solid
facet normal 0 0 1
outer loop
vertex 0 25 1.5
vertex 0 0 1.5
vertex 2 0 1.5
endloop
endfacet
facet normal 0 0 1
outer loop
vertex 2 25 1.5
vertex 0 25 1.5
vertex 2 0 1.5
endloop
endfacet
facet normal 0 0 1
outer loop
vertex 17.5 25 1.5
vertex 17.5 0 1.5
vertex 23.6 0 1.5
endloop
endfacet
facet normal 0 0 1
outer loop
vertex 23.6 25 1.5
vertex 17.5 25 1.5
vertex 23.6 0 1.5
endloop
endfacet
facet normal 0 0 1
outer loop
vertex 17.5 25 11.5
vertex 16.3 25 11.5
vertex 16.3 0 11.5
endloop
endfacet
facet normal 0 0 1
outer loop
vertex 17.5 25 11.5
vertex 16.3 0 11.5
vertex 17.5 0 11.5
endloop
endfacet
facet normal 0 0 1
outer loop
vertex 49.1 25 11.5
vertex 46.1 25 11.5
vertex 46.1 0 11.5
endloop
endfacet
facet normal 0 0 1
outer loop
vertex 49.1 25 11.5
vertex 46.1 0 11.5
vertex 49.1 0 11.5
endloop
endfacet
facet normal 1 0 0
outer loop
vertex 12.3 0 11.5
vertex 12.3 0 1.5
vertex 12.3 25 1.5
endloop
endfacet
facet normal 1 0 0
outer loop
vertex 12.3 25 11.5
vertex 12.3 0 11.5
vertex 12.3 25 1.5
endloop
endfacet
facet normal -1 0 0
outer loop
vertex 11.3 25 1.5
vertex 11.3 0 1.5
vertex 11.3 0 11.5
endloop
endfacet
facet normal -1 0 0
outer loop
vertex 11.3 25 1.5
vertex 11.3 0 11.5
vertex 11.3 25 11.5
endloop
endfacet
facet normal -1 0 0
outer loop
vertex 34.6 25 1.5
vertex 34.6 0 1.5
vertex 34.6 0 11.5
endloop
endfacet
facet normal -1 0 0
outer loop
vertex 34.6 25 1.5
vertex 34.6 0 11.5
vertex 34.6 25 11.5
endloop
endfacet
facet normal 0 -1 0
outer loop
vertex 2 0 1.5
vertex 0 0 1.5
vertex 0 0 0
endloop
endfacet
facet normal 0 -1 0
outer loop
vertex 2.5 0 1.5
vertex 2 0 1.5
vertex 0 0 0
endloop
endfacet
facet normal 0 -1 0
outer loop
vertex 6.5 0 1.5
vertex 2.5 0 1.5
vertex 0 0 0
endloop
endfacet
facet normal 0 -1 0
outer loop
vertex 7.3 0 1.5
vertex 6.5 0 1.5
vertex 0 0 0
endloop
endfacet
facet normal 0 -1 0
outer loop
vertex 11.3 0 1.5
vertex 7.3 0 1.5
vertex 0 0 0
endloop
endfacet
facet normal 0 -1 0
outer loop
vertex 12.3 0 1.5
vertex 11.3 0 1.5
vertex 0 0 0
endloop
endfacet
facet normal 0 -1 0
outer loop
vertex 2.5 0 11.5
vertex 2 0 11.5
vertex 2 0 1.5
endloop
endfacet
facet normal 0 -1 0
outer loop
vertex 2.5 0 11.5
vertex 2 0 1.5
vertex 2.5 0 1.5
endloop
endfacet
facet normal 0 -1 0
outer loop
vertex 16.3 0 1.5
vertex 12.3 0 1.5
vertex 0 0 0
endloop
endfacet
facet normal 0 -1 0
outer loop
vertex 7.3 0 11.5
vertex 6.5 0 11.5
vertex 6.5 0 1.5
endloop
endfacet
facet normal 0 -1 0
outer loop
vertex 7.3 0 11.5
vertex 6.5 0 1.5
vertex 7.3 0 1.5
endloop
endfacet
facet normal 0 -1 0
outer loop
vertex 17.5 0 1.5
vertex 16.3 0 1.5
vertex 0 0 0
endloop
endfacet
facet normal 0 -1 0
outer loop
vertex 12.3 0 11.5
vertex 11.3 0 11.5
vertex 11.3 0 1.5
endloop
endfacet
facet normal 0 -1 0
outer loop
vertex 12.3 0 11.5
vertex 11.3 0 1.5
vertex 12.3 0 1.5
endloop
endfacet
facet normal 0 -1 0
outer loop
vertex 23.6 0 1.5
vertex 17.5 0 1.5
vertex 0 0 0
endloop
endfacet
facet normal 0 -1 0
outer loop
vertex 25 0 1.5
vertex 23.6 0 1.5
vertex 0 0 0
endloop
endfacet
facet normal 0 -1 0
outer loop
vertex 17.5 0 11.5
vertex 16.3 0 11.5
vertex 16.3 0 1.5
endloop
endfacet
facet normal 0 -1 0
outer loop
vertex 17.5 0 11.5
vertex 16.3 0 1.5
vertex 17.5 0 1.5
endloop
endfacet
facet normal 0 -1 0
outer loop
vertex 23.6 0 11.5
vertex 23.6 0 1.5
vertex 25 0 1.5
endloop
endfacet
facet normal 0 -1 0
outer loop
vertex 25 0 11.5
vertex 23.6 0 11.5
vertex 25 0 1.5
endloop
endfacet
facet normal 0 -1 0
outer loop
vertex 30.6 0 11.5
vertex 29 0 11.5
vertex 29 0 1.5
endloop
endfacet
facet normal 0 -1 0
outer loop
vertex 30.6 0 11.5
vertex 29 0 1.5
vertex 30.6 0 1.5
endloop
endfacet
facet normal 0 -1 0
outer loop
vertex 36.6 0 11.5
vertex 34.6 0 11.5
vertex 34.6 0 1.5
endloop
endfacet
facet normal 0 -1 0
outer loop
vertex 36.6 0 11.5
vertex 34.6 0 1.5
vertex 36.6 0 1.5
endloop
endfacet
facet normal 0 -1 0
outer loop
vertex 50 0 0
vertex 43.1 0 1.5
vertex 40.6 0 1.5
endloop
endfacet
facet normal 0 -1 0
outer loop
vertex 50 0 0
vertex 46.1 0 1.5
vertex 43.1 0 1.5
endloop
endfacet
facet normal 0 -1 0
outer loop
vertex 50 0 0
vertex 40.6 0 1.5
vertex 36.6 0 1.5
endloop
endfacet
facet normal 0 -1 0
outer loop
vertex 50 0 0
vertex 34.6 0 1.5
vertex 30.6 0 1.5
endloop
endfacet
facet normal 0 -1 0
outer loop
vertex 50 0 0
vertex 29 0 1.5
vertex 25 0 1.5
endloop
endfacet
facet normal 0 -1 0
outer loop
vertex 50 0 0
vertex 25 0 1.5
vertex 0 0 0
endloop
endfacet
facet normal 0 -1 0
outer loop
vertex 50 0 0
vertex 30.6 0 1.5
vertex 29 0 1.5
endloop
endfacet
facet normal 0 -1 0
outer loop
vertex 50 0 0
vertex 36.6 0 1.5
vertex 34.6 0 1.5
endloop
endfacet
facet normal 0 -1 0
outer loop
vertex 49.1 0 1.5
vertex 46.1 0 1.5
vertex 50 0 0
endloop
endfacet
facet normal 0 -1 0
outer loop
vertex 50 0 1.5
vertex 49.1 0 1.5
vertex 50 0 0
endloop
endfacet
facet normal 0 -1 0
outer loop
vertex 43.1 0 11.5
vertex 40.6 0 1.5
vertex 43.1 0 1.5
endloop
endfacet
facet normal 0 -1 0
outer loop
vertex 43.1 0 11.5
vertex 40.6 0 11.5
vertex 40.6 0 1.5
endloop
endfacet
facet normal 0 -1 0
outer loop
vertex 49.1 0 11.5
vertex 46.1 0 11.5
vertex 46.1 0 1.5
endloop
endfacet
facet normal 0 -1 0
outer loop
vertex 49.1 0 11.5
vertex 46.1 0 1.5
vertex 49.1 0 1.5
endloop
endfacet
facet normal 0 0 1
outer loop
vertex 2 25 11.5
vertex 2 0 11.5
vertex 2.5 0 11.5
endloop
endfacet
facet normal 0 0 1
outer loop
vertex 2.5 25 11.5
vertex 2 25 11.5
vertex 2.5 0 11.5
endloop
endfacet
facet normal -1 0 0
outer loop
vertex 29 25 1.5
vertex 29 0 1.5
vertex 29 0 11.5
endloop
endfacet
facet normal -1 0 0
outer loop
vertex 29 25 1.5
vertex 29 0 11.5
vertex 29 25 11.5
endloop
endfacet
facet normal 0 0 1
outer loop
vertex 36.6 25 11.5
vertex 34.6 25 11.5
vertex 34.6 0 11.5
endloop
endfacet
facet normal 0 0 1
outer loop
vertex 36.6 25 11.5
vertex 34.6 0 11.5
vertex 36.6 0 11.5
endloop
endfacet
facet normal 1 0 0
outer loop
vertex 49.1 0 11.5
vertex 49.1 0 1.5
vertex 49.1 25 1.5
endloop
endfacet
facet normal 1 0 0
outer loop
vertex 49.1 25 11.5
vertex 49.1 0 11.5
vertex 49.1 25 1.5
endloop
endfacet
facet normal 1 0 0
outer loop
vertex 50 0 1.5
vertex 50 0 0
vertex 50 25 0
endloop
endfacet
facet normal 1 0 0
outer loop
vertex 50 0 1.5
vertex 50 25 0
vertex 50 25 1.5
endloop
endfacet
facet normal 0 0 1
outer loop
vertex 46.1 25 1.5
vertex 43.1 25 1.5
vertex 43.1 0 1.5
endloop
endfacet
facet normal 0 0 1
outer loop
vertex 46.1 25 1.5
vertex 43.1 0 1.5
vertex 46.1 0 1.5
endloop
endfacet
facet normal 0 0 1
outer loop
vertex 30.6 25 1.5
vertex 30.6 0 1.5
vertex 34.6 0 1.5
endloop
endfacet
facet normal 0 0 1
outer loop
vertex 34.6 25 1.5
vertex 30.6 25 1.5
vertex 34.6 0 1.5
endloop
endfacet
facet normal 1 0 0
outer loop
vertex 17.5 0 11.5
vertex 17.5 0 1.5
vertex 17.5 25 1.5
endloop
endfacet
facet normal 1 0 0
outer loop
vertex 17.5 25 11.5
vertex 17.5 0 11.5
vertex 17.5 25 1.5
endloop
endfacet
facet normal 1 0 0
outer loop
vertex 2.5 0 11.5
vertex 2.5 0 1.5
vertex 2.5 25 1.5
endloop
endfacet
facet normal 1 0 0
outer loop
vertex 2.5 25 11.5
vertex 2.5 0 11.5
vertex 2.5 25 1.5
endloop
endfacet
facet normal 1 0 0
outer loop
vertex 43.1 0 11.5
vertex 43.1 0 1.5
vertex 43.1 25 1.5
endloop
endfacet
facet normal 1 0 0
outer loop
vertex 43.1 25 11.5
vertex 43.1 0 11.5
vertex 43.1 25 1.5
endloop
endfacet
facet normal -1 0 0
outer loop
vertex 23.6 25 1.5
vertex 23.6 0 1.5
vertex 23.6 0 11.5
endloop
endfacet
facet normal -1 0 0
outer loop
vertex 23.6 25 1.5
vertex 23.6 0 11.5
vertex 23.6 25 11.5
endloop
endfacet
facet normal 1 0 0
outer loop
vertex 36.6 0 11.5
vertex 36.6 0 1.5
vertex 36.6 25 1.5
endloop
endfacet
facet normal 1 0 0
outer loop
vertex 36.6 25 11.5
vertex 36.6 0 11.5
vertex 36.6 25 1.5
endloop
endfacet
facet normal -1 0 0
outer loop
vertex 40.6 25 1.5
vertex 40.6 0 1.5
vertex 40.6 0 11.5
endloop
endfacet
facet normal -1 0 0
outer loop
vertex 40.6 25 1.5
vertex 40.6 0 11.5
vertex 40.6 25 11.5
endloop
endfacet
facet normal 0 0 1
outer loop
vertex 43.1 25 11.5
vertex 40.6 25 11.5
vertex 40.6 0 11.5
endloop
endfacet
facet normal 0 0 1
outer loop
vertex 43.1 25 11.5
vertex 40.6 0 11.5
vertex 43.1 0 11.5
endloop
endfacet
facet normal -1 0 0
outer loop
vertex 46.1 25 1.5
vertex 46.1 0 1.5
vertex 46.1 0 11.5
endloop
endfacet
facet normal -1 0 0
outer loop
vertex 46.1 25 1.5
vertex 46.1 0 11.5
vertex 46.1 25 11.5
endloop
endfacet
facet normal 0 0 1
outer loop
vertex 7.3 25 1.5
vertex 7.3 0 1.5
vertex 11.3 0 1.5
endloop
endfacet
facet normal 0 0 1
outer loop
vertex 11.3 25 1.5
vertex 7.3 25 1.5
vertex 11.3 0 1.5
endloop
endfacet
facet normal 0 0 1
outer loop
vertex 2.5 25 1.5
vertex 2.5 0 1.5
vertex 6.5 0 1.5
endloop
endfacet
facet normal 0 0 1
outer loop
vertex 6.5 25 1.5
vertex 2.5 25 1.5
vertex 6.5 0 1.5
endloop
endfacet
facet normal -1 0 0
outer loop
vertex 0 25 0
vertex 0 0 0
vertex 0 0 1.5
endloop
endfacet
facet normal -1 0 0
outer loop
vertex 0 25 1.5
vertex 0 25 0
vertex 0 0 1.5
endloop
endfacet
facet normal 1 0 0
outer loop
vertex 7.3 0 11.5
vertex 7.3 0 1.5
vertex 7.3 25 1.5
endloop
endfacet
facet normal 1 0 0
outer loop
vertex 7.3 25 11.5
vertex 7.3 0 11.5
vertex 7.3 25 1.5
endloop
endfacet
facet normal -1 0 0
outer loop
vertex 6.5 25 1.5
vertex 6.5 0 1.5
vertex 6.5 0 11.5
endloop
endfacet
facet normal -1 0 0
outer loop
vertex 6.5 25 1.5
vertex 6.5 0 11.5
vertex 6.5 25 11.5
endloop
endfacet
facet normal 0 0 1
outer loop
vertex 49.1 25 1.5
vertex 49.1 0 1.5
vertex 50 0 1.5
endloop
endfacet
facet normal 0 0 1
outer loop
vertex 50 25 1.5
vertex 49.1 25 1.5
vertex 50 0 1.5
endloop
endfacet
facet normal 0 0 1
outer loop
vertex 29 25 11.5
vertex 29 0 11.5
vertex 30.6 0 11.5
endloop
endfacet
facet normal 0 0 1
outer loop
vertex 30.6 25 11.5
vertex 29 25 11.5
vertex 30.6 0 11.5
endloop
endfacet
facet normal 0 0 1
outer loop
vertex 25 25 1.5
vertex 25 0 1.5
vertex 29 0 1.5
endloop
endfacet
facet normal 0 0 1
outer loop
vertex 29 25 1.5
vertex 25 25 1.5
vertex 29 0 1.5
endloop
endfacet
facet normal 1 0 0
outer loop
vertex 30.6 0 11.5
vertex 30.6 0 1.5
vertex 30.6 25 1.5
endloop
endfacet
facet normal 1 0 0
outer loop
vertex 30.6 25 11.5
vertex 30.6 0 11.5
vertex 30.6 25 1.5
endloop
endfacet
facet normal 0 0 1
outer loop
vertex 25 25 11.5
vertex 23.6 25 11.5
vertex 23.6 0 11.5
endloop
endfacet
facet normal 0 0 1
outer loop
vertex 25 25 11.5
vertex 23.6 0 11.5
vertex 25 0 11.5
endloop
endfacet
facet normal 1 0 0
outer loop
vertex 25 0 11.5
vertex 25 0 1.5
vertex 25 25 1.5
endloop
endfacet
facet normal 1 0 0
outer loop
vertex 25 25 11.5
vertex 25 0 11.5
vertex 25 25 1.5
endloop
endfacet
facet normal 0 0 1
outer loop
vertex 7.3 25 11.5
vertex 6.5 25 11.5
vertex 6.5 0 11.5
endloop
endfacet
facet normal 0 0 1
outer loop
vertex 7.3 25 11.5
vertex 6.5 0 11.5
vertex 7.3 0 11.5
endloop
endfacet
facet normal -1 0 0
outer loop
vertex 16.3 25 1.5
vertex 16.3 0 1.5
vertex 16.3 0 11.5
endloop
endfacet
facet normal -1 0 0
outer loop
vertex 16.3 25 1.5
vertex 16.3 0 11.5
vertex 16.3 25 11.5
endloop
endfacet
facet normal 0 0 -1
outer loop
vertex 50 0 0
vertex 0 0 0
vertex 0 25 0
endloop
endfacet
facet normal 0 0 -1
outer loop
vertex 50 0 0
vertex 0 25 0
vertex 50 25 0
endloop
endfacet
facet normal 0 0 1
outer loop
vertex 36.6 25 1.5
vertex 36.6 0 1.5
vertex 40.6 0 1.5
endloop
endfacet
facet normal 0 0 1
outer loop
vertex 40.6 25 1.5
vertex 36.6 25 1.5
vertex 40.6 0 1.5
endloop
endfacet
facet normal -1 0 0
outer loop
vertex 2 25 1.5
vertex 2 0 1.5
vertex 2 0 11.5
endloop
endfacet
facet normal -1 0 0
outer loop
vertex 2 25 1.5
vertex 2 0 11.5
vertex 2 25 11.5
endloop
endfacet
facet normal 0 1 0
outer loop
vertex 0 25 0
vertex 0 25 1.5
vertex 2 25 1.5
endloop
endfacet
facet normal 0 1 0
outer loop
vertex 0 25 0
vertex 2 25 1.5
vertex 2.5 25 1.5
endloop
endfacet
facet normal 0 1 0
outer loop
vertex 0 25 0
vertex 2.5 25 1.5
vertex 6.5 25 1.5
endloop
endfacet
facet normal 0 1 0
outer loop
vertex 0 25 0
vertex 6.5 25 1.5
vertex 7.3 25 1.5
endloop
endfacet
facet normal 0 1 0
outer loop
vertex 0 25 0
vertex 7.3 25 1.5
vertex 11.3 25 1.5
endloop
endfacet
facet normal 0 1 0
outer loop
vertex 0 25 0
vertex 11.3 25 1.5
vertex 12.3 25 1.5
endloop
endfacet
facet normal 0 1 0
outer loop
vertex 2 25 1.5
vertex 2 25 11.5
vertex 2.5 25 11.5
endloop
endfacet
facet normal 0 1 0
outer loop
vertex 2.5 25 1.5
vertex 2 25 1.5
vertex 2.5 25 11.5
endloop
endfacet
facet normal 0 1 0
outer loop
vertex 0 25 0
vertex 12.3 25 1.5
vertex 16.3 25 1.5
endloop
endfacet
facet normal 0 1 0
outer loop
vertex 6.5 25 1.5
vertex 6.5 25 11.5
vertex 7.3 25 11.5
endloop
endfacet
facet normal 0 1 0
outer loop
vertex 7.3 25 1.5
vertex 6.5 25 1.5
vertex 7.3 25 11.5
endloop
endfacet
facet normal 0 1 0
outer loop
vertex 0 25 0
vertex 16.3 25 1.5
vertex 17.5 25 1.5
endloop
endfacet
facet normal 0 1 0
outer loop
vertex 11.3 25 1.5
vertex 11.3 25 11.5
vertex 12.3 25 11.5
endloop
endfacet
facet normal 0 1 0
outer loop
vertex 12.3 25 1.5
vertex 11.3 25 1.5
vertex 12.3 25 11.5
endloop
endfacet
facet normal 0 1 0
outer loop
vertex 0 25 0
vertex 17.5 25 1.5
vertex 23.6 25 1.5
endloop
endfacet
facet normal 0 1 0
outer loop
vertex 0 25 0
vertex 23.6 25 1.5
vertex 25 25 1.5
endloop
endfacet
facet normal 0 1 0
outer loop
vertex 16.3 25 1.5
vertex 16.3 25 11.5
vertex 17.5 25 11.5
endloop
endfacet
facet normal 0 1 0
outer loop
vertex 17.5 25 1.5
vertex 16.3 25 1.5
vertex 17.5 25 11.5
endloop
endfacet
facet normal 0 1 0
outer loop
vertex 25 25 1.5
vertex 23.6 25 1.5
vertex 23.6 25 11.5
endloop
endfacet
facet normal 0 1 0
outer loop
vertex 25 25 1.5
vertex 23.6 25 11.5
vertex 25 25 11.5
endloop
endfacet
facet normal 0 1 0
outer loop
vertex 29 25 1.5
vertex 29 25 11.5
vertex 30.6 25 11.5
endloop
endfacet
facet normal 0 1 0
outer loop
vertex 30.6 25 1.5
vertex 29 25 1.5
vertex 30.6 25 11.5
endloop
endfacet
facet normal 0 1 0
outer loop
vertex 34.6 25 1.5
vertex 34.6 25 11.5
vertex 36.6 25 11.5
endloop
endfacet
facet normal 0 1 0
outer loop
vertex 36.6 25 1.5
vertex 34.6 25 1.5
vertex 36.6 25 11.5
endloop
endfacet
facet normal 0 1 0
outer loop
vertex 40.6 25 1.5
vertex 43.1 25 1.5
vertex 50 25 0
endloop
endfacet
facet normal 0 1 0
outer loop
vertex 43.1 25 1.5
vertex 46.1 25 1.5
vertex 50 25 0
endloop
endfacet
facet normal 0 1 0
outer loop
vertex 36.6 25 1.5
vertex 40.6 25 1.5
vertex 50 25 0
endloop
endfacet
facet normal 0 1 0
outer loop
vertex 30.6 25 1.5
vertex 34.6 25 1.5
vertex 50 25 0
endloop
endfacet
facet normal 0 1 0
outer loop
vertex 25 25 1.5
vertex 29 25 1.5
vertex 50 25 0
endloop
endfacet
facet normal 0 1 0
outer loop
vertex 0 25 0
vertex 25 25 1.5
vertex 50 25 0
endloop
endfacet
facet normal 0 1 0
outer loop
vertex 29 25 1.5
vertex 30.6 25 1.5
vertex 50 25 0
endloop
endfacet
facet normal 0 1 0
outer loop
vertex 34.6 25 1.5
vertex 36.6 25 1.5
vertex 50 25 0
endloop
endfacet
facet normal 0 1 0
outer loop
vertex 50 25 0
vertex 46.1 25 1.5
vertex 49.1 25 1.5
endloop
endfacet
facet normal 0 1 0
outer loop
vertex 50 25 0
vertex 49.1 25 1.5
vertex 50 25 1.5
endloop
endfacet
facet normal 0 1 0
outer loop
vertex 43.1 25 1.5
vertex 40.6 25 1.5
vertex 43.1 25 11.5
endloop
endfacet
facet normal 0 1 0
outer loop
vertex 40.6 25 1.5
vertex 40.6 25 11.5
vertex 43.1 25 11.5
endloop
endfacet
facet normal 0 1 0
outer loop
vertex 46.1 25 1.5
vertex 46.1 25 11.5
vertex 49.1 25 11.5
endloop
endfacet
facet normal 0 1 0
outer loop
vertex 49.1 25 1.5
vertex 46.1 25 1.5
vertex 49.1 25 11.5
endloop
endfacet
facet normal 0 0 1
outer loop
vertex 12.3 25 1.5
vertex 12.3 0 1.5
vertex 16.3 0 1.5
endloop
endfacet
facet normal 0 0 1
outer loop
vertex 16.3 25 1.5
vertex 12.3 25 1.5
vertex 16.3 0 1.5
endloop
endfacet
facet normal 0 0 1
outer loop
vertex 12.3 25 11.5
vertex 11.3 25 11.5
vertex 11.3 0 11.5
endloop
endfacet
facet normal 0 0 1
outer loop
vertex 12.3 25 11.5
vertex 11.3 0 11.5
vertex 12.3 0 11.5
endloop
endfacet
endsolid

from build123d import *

# Parameters (mm, degrees)
F0_W     = 50
F0_H     = 1.5
F1_DEPTH = 25
F3_W     = 0.5
F3_H     = 25
F3_W_2   = 0.8
F3_W_3   = 1
F3_W_4   = 1.4
F3_W_5   = 1.2
F3_W_6   = 1.6
F3_W_7   = 2
F3_W_8   = 2.5
F3_W_9   = 3
F4_DEPTH = 10


with BuildPart() as f1:
    # F0 (on Front) → F1 (new body)
    with BuildSketch(Plane.XZ):
        with Locations((25, 0.75)):
            Rectangle(F0_W, F0_H)
    extrude(amount=-F1_DEPTH)

    # F3 (on offset) → F4 (join)
    with BuildSketch(Plane.XY.offset(1.5)):
        with Locations((2.25, 12.5)):
            Rectangle(F3_W, F3_H)
        with Locations((6.9, 12.5)):
            Rectangle(F3_W_2, F3_H)
        with Locations((11.8, 12.5)):
            Rectangle(F3_W_3, F3_H)
        with Locations((24.3, 12.5)):
            Rectangle(F3_W_4, F3_H)
        with Locations((16.9, 12.5)):
            Rectangle(F3_W_5, F3_H)
        with Locations((29.8, 12.5)):
            Rectangle(F3_W_6, F3_H)
        with Locations((35.6, 12.5)):
            Rectangle(F3_W_7, F3_H)
        with Locations((41.85, 12.5)):
            Rectangle(F3_W_8, F3_H)
        with Locations((47.6, 12.5)):
            Rectangle(F3_W_9, F3_H)
    extrude(amount=F4_DEPTH)


solid = f1.part
